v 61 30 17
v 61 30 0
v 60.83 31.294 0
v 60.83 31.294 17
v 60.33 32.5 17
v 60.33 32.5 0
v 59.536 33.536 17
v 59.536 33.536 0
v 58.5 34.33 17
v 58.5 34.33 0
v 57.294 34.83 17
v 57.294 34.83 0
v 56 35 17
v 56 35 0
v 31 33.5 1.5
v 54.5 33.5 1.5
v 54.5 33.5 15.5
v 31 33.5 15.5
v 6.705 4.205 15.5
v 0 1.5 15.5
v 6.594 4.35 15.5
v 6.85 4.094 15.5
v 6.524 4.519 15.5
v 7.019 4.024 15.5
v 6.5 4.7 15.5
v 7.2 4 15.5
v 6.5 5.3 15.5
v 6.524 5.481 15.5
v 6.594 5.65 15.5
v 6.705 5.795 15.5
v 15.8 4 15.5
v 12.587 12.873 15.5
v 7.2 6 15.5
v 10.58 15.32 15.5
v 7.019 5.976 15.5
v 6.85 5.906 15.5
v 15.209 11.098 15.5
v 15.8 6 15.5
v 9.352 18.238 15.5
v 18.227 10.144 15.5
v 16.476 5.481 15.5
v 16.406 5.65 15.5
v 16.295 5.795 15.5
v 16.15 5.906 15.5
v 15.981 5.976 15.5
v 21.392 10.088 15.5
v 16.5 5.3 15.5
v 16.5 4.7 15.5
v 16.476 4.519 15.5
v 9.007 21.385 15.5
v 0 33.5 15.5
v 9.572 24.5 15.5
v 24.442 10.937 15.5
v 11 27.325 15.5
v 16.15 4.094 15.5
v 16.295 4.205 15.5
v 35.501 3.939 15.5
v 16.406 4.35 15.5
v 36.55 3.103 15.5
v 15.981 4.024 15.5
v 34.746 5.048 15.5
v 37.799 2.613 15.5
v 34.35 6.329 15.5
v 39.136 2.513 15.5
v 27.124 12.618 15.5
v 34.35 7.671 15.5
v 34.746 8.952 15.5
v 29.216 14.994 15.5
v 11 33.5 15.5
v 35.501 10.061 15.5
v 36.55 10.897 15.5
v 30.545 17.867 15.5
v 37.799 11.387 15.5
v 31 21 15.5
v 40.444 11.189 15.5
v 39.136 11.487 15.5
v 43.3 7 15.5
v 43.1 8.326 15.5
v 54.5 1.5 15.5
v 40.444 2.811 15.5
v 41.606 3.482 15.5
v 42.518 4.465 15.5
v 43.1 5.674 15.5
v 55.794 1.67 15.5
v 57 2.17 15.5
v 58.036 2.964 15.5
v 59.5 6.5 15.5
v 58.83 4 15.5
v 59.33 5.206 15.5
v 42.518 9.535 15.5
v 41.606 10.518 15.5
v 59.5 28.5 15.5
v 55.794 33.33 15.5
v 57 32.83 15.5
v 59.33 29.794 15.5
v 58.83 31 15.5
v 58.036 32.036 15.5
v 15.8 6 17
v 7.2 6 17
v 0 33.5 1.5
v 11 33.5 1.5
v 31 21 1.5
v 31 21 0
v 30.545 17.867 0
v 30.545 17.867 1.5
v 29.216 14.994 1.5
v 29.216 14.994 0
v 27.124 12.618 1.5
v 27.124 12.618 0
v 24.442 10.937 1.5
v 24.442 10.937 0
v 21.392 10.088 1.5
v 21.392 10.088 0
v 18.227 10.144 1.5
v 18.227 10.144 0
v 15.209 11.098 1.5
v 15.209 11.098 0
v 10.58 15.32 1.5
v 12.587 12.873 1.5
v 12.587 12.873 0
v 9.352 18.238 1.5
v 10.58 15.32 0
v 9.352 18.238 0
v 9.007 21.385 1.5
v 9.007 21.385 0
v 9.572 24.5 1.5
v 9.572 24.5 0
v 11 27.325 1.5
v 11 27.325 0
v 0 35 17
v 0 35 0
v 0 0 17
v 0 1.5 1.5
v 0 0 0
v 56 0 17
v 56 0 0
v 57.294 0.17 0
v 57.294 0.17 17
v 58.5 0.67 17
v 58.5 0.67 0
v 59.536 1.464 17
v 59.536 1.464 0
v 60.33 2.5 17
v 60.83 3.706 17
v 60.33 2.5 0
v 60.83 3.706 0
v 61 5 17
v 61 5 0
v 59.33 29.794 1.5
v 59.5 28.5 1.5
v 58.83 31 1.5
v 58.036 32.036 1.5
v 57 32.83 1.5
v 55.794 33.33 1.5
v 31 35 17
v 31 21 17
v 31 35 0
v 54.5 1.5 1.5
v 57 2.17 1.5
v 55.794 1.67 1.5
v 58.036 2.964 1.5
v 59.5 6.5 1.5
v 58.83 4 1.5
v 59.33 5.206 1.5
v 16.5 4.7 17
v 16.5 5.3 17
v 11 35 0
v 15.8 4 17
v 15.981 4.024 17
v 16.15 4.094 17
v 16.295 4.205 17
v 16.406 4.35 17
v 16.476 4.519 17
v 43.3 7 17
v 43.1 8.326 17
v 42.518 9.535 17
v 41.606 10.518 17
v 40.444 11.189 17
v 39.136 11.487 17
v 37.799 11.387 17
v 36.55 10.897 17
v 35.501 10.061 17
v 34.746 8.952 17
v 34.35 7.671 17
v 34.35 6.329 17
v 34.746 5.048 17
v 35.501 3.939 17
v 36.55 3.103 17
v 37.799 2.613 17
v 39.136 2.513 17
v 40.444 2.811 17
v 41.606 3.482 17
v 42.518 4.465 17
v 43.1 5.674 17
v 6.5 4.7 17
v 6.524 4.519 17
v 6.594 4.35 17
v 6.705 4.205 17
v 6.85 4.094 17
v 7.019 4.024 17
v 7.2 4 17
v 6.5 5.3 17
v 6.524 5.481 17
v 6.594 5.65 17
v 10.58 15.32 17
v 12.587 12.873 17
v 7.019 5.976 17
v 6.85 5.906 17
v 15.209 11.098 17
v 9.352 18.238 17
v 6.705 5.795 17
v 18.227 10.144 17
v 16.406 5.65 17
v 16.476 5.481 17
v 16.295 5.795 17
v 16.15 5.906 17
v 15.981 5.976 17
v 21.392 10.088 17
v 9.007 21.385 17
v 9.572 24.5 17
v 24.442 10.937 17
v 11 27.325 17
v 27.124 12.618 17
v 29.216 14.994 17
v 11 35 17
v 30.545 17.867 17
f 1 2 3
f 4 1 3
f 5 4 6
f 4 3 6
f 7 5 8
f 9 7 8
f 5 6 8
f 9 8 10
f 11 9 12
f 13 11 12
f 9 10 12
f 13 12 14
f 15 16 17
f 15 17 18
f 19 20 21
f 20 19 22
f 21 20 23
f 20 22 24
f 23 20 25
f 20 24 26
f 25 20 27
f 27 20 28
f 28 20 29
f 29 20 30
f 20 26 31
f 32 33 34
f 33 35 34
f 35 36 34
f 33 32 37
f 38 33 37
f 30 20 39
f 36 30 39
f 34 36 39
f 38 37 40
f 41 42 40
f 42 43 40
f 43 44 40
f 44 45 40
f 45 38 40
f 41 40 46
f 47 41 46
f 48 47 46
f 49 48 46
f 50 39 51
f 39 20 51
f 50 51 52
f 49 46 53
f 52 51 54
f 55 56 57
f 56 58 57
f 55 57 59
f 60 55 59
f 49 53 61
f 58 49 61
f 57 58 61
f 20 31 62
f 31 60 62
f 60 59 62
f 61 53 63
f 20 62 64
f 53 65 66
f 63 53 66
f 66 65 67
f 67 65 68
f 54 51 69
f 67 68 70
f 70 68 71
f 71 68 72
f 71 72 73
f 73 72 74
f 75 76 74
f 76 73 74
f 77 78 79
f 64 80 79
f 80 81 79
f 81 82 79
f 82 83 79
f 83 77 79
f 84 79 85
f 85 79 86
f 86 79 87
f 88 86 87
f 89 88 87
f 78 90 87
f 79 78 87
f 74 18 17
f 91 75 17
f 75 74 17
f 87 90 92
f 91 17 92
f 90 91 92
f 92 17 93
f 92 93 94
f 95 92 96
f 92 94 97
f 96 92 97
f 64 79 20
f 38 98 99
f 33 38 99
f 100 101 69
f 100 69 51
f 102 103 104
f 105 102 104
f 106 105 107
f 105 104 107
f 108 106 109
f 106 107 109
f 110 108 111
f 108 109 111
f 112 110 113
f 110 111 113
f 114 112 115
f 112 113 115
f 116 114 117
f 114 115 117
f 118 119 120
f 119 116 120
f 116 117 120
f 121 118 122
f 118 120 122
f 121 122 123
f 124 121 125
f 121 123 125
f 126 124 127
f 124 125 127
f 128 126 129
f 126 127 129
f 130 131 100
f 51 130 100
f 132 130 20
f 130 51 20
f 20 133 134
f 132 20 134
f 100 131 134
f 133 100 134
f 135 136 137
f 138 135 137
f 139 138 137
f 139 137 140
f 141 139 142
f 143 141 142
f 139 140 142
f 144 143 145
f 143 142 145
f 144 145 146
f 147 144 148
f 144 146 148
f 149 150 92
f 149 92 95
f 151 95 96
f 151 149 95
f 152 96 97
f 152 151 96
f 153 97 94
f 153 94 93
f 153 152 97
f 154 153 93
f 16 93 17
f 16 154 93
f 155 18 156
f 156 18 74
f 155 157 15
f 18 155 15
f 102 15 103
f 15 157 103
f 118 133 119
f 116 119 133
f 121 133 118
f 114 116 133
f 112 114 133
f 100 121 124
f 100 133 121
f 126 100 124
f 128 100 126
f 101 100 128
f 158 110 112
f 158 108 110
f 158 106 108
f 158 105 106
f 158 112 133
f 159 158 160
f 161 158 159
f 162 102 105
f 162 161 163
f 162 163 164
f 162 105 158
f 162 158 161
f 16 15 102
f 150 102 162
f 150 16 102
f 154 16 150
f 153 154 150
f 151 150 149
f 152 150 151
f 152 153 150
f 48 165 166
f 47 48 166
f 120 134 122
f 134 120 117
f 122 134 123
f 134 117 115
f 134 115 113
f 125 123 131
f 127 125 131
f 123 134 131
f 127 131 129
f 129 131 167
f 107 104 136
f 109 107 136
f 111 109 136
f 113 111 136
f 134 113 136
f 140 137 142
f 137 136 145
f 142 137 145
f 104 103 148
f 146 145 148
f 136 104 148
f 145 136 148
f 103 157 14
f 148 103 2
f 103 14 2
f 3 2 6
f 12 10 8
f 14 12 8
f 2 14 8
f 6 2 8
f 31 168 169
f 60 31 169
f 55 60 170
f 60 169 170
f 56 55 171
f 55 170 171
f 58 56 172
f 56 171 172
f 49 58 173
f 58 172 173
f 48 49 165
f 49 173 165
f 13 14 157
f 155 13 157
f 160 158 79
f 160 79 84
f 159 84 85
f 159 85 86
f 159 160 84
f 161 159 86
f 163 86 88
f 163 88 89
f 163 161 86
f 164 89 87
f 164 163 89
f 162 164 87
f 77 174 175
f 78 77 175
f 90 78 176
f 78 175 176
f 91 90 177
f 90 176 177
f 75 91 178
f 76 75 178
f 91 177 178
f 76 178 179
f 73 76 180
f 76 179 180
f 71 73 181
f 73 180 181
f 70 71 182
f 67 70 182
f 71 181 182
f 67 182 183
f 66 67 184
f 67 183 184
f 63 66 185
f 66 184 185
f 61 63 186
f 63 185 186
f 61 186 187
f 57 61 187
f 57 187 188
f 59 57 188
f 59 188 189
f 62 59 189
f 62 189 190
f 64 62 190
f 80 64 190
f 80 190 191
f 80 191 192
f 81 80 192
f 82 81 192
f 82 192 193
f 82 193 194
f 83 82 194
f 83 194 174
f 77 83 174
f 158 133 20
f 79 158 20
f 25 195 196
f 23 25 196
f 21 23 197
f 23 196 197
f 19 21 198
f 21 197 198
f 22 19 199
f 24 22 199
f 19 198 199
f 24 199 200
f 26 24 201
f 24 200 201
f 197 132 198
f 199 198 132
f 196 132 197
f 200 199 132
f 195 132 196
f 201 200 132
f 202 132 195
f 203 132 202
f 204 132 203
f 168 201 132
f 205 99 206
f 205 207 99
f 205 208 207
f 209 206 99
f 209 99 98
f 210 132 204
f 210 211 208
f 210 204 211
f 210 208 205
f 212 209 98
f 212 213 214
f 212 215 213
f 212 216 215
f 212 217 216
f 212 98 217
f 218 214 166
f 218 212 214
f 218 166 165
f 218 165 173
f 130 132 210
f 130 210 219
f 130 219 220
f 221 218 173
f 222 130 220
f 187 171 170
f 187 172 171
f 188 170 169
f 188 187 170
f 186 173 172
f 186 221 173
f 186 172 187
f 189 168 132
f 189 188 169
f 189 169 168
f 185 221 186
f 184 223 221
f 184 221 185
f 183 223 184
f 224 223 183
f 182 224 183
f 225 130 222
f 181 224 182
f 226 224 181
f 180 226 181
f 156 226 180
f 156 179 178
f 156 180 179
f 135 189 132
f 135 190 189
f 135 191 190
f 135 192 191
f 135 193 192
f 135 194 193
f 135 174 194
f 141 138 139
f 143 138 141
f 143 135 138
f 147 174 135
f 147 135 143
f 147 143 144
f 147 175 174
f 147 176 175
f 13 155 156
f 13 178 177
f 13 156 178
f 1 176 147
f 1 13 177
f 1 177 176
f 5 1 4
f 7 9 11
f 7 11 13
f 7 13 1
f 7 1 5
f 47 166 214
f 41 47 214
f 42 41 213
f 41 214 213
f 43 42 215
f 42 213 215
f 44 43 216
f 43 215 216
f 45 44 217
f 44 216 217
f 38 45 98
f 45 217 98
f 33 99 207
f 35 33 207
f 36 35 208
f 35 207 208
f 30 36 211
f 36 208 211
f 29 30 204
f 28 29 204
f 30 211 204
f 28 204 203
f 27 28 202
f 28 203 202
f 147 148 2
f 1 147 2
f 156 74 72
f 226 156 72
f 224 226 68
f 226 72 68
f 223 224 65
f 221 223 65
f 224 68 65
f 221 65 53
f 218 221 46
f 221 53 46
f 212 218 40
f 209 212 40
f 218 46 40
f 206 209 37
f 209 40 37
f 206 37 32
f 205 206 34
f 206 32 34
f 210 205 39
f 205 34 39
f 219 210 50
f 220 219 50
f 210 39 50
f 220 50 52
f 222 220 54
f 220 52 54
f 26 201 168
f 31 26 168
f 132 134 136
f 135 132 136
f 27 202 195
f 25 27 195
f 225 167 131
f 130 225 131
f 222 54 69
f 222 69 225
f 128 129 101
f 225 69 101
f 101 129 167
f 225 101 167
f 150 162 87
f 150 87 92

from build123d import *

# Parameters (mm, degrees)
BOSS_EXTRUDE2_DEPTH = 17
CUT_EXTRUDE1_DEPTH  = 14
CUT_EXTRUDE3_DEPTH  = 5
SKETCH9_W           = 14
SKETCH9_H           = 32
CUT_EXTRUDE4_DEPTH  = 11
SKETCH11_R          = 4.5
CUT_EXTRUDE5_DEPTH  = 10.5


with BuildPart() as part:
    # Sketch1 → Boss-Extrude2 (new body)
    with BuildSketch(Plane.XY):
        with BuildLine():
            Line((61, 5), (61, 30))
            ThreePointArc((61, 30), (59.535533906, 33.535533906), (56, 35))
            Line((56, 35), (31, 35))
            Line((31, 35), (31, 21))
            ThreePointArc((31, 21), (16.68337521, 10.511911518), (11, 27.32455532))
            Line((11, 27.32455532), (11, 35))
            Line((11, 35), (0, 35))
            Line((0, 35), (0, 0))
            Line((0, 0), (56, 0))
            ThreePointArc((56, 0), (59.535533906, 1.464466094), (61, 5))
        make_face()
    extrude(amount=BOSS_EXTRUDE2_DEPTH)

    # Sketch5 → Cut-Extrude1 (cut)
    with BuildSketch(Plane(origin=(0, 0, 1.5), x_dir=(-1, 0, 0), z_dir=(0, 0, -1))):
        with BuildLine():
            Line((-54.5, 33.5), (-1.5, 33.5))
            Line((-1.5, 33.5), (-1.5, 1.5))
            Line((-1.5, 1.5), (-54.5, 1.5))
            ThreePointArc((-54.5, 1.5), (-58.035533906, 2.964466094), (-59.5, 6.5))
            Line((-59.5, 6.5), (-59.5, 28.5))
            ThreePointArc((-59.5, 28.5), (-58.035533906, 32.035533906), (-54.5, 33.5))
        make_face()
    extrude(amount=-CUT_EXTRUDE1_DEPTH, mode=Mode.SUBTRACT)

    # Sketch10 → Cut-Extrude3 (cut)
    with BuildSketch(Plane.XY.offset(17)):
        with BuildLine():
            Line((7.2, 4), (15.8, 4))
            ThreePointArc((15.8, 4), (16.294974747, 4.205025253), (16.5, 4.7))
            Line((16.5, 4.7), (16.5, 5.3))
            ThreePointArc((16.5, 5.3), (16.294974747, 5.794974747), (15.8, 6))
            Line((15.8, 6), (7.2, 6))
            ThreePointArc((7.2, 6), (6.705025253, 5.794974747), (6.5, 5.3))
            Line((6.5, 5.3), (6.5, 4.7))
            ThreePointArc((6.5, 4.7), (6.705025253, 4.205025253), (7.2, 4))
        make_face()
    extrude(amount=-CUT_EXTRUDE3_DEPTH, mode=Mode.SUBTRACT)

    # Sketch9 → Cut-Extrude4 (cut)
    with BuildSketch(Plane.ZY):
        with Locations((8.5, 17.5)):
            Rectangle(SKETCH9_W, SKETCH9_H)
    extrude(amount=-CUT_EXTRUDE4_DEPTH, mode=Mode.SUBTRACT)

    # Sketch11 → Cut-Extrude5 (cut)
    with BuildSketch(Plane.XY.offset(17)):
        with Locations((38.8, 7)):
            Circle(SKETCH11_R)
    extrude(amount=-CUT_EXTRUDE5_DEPTH, mode=Mode.SUBTRACT)


solid = part.part
